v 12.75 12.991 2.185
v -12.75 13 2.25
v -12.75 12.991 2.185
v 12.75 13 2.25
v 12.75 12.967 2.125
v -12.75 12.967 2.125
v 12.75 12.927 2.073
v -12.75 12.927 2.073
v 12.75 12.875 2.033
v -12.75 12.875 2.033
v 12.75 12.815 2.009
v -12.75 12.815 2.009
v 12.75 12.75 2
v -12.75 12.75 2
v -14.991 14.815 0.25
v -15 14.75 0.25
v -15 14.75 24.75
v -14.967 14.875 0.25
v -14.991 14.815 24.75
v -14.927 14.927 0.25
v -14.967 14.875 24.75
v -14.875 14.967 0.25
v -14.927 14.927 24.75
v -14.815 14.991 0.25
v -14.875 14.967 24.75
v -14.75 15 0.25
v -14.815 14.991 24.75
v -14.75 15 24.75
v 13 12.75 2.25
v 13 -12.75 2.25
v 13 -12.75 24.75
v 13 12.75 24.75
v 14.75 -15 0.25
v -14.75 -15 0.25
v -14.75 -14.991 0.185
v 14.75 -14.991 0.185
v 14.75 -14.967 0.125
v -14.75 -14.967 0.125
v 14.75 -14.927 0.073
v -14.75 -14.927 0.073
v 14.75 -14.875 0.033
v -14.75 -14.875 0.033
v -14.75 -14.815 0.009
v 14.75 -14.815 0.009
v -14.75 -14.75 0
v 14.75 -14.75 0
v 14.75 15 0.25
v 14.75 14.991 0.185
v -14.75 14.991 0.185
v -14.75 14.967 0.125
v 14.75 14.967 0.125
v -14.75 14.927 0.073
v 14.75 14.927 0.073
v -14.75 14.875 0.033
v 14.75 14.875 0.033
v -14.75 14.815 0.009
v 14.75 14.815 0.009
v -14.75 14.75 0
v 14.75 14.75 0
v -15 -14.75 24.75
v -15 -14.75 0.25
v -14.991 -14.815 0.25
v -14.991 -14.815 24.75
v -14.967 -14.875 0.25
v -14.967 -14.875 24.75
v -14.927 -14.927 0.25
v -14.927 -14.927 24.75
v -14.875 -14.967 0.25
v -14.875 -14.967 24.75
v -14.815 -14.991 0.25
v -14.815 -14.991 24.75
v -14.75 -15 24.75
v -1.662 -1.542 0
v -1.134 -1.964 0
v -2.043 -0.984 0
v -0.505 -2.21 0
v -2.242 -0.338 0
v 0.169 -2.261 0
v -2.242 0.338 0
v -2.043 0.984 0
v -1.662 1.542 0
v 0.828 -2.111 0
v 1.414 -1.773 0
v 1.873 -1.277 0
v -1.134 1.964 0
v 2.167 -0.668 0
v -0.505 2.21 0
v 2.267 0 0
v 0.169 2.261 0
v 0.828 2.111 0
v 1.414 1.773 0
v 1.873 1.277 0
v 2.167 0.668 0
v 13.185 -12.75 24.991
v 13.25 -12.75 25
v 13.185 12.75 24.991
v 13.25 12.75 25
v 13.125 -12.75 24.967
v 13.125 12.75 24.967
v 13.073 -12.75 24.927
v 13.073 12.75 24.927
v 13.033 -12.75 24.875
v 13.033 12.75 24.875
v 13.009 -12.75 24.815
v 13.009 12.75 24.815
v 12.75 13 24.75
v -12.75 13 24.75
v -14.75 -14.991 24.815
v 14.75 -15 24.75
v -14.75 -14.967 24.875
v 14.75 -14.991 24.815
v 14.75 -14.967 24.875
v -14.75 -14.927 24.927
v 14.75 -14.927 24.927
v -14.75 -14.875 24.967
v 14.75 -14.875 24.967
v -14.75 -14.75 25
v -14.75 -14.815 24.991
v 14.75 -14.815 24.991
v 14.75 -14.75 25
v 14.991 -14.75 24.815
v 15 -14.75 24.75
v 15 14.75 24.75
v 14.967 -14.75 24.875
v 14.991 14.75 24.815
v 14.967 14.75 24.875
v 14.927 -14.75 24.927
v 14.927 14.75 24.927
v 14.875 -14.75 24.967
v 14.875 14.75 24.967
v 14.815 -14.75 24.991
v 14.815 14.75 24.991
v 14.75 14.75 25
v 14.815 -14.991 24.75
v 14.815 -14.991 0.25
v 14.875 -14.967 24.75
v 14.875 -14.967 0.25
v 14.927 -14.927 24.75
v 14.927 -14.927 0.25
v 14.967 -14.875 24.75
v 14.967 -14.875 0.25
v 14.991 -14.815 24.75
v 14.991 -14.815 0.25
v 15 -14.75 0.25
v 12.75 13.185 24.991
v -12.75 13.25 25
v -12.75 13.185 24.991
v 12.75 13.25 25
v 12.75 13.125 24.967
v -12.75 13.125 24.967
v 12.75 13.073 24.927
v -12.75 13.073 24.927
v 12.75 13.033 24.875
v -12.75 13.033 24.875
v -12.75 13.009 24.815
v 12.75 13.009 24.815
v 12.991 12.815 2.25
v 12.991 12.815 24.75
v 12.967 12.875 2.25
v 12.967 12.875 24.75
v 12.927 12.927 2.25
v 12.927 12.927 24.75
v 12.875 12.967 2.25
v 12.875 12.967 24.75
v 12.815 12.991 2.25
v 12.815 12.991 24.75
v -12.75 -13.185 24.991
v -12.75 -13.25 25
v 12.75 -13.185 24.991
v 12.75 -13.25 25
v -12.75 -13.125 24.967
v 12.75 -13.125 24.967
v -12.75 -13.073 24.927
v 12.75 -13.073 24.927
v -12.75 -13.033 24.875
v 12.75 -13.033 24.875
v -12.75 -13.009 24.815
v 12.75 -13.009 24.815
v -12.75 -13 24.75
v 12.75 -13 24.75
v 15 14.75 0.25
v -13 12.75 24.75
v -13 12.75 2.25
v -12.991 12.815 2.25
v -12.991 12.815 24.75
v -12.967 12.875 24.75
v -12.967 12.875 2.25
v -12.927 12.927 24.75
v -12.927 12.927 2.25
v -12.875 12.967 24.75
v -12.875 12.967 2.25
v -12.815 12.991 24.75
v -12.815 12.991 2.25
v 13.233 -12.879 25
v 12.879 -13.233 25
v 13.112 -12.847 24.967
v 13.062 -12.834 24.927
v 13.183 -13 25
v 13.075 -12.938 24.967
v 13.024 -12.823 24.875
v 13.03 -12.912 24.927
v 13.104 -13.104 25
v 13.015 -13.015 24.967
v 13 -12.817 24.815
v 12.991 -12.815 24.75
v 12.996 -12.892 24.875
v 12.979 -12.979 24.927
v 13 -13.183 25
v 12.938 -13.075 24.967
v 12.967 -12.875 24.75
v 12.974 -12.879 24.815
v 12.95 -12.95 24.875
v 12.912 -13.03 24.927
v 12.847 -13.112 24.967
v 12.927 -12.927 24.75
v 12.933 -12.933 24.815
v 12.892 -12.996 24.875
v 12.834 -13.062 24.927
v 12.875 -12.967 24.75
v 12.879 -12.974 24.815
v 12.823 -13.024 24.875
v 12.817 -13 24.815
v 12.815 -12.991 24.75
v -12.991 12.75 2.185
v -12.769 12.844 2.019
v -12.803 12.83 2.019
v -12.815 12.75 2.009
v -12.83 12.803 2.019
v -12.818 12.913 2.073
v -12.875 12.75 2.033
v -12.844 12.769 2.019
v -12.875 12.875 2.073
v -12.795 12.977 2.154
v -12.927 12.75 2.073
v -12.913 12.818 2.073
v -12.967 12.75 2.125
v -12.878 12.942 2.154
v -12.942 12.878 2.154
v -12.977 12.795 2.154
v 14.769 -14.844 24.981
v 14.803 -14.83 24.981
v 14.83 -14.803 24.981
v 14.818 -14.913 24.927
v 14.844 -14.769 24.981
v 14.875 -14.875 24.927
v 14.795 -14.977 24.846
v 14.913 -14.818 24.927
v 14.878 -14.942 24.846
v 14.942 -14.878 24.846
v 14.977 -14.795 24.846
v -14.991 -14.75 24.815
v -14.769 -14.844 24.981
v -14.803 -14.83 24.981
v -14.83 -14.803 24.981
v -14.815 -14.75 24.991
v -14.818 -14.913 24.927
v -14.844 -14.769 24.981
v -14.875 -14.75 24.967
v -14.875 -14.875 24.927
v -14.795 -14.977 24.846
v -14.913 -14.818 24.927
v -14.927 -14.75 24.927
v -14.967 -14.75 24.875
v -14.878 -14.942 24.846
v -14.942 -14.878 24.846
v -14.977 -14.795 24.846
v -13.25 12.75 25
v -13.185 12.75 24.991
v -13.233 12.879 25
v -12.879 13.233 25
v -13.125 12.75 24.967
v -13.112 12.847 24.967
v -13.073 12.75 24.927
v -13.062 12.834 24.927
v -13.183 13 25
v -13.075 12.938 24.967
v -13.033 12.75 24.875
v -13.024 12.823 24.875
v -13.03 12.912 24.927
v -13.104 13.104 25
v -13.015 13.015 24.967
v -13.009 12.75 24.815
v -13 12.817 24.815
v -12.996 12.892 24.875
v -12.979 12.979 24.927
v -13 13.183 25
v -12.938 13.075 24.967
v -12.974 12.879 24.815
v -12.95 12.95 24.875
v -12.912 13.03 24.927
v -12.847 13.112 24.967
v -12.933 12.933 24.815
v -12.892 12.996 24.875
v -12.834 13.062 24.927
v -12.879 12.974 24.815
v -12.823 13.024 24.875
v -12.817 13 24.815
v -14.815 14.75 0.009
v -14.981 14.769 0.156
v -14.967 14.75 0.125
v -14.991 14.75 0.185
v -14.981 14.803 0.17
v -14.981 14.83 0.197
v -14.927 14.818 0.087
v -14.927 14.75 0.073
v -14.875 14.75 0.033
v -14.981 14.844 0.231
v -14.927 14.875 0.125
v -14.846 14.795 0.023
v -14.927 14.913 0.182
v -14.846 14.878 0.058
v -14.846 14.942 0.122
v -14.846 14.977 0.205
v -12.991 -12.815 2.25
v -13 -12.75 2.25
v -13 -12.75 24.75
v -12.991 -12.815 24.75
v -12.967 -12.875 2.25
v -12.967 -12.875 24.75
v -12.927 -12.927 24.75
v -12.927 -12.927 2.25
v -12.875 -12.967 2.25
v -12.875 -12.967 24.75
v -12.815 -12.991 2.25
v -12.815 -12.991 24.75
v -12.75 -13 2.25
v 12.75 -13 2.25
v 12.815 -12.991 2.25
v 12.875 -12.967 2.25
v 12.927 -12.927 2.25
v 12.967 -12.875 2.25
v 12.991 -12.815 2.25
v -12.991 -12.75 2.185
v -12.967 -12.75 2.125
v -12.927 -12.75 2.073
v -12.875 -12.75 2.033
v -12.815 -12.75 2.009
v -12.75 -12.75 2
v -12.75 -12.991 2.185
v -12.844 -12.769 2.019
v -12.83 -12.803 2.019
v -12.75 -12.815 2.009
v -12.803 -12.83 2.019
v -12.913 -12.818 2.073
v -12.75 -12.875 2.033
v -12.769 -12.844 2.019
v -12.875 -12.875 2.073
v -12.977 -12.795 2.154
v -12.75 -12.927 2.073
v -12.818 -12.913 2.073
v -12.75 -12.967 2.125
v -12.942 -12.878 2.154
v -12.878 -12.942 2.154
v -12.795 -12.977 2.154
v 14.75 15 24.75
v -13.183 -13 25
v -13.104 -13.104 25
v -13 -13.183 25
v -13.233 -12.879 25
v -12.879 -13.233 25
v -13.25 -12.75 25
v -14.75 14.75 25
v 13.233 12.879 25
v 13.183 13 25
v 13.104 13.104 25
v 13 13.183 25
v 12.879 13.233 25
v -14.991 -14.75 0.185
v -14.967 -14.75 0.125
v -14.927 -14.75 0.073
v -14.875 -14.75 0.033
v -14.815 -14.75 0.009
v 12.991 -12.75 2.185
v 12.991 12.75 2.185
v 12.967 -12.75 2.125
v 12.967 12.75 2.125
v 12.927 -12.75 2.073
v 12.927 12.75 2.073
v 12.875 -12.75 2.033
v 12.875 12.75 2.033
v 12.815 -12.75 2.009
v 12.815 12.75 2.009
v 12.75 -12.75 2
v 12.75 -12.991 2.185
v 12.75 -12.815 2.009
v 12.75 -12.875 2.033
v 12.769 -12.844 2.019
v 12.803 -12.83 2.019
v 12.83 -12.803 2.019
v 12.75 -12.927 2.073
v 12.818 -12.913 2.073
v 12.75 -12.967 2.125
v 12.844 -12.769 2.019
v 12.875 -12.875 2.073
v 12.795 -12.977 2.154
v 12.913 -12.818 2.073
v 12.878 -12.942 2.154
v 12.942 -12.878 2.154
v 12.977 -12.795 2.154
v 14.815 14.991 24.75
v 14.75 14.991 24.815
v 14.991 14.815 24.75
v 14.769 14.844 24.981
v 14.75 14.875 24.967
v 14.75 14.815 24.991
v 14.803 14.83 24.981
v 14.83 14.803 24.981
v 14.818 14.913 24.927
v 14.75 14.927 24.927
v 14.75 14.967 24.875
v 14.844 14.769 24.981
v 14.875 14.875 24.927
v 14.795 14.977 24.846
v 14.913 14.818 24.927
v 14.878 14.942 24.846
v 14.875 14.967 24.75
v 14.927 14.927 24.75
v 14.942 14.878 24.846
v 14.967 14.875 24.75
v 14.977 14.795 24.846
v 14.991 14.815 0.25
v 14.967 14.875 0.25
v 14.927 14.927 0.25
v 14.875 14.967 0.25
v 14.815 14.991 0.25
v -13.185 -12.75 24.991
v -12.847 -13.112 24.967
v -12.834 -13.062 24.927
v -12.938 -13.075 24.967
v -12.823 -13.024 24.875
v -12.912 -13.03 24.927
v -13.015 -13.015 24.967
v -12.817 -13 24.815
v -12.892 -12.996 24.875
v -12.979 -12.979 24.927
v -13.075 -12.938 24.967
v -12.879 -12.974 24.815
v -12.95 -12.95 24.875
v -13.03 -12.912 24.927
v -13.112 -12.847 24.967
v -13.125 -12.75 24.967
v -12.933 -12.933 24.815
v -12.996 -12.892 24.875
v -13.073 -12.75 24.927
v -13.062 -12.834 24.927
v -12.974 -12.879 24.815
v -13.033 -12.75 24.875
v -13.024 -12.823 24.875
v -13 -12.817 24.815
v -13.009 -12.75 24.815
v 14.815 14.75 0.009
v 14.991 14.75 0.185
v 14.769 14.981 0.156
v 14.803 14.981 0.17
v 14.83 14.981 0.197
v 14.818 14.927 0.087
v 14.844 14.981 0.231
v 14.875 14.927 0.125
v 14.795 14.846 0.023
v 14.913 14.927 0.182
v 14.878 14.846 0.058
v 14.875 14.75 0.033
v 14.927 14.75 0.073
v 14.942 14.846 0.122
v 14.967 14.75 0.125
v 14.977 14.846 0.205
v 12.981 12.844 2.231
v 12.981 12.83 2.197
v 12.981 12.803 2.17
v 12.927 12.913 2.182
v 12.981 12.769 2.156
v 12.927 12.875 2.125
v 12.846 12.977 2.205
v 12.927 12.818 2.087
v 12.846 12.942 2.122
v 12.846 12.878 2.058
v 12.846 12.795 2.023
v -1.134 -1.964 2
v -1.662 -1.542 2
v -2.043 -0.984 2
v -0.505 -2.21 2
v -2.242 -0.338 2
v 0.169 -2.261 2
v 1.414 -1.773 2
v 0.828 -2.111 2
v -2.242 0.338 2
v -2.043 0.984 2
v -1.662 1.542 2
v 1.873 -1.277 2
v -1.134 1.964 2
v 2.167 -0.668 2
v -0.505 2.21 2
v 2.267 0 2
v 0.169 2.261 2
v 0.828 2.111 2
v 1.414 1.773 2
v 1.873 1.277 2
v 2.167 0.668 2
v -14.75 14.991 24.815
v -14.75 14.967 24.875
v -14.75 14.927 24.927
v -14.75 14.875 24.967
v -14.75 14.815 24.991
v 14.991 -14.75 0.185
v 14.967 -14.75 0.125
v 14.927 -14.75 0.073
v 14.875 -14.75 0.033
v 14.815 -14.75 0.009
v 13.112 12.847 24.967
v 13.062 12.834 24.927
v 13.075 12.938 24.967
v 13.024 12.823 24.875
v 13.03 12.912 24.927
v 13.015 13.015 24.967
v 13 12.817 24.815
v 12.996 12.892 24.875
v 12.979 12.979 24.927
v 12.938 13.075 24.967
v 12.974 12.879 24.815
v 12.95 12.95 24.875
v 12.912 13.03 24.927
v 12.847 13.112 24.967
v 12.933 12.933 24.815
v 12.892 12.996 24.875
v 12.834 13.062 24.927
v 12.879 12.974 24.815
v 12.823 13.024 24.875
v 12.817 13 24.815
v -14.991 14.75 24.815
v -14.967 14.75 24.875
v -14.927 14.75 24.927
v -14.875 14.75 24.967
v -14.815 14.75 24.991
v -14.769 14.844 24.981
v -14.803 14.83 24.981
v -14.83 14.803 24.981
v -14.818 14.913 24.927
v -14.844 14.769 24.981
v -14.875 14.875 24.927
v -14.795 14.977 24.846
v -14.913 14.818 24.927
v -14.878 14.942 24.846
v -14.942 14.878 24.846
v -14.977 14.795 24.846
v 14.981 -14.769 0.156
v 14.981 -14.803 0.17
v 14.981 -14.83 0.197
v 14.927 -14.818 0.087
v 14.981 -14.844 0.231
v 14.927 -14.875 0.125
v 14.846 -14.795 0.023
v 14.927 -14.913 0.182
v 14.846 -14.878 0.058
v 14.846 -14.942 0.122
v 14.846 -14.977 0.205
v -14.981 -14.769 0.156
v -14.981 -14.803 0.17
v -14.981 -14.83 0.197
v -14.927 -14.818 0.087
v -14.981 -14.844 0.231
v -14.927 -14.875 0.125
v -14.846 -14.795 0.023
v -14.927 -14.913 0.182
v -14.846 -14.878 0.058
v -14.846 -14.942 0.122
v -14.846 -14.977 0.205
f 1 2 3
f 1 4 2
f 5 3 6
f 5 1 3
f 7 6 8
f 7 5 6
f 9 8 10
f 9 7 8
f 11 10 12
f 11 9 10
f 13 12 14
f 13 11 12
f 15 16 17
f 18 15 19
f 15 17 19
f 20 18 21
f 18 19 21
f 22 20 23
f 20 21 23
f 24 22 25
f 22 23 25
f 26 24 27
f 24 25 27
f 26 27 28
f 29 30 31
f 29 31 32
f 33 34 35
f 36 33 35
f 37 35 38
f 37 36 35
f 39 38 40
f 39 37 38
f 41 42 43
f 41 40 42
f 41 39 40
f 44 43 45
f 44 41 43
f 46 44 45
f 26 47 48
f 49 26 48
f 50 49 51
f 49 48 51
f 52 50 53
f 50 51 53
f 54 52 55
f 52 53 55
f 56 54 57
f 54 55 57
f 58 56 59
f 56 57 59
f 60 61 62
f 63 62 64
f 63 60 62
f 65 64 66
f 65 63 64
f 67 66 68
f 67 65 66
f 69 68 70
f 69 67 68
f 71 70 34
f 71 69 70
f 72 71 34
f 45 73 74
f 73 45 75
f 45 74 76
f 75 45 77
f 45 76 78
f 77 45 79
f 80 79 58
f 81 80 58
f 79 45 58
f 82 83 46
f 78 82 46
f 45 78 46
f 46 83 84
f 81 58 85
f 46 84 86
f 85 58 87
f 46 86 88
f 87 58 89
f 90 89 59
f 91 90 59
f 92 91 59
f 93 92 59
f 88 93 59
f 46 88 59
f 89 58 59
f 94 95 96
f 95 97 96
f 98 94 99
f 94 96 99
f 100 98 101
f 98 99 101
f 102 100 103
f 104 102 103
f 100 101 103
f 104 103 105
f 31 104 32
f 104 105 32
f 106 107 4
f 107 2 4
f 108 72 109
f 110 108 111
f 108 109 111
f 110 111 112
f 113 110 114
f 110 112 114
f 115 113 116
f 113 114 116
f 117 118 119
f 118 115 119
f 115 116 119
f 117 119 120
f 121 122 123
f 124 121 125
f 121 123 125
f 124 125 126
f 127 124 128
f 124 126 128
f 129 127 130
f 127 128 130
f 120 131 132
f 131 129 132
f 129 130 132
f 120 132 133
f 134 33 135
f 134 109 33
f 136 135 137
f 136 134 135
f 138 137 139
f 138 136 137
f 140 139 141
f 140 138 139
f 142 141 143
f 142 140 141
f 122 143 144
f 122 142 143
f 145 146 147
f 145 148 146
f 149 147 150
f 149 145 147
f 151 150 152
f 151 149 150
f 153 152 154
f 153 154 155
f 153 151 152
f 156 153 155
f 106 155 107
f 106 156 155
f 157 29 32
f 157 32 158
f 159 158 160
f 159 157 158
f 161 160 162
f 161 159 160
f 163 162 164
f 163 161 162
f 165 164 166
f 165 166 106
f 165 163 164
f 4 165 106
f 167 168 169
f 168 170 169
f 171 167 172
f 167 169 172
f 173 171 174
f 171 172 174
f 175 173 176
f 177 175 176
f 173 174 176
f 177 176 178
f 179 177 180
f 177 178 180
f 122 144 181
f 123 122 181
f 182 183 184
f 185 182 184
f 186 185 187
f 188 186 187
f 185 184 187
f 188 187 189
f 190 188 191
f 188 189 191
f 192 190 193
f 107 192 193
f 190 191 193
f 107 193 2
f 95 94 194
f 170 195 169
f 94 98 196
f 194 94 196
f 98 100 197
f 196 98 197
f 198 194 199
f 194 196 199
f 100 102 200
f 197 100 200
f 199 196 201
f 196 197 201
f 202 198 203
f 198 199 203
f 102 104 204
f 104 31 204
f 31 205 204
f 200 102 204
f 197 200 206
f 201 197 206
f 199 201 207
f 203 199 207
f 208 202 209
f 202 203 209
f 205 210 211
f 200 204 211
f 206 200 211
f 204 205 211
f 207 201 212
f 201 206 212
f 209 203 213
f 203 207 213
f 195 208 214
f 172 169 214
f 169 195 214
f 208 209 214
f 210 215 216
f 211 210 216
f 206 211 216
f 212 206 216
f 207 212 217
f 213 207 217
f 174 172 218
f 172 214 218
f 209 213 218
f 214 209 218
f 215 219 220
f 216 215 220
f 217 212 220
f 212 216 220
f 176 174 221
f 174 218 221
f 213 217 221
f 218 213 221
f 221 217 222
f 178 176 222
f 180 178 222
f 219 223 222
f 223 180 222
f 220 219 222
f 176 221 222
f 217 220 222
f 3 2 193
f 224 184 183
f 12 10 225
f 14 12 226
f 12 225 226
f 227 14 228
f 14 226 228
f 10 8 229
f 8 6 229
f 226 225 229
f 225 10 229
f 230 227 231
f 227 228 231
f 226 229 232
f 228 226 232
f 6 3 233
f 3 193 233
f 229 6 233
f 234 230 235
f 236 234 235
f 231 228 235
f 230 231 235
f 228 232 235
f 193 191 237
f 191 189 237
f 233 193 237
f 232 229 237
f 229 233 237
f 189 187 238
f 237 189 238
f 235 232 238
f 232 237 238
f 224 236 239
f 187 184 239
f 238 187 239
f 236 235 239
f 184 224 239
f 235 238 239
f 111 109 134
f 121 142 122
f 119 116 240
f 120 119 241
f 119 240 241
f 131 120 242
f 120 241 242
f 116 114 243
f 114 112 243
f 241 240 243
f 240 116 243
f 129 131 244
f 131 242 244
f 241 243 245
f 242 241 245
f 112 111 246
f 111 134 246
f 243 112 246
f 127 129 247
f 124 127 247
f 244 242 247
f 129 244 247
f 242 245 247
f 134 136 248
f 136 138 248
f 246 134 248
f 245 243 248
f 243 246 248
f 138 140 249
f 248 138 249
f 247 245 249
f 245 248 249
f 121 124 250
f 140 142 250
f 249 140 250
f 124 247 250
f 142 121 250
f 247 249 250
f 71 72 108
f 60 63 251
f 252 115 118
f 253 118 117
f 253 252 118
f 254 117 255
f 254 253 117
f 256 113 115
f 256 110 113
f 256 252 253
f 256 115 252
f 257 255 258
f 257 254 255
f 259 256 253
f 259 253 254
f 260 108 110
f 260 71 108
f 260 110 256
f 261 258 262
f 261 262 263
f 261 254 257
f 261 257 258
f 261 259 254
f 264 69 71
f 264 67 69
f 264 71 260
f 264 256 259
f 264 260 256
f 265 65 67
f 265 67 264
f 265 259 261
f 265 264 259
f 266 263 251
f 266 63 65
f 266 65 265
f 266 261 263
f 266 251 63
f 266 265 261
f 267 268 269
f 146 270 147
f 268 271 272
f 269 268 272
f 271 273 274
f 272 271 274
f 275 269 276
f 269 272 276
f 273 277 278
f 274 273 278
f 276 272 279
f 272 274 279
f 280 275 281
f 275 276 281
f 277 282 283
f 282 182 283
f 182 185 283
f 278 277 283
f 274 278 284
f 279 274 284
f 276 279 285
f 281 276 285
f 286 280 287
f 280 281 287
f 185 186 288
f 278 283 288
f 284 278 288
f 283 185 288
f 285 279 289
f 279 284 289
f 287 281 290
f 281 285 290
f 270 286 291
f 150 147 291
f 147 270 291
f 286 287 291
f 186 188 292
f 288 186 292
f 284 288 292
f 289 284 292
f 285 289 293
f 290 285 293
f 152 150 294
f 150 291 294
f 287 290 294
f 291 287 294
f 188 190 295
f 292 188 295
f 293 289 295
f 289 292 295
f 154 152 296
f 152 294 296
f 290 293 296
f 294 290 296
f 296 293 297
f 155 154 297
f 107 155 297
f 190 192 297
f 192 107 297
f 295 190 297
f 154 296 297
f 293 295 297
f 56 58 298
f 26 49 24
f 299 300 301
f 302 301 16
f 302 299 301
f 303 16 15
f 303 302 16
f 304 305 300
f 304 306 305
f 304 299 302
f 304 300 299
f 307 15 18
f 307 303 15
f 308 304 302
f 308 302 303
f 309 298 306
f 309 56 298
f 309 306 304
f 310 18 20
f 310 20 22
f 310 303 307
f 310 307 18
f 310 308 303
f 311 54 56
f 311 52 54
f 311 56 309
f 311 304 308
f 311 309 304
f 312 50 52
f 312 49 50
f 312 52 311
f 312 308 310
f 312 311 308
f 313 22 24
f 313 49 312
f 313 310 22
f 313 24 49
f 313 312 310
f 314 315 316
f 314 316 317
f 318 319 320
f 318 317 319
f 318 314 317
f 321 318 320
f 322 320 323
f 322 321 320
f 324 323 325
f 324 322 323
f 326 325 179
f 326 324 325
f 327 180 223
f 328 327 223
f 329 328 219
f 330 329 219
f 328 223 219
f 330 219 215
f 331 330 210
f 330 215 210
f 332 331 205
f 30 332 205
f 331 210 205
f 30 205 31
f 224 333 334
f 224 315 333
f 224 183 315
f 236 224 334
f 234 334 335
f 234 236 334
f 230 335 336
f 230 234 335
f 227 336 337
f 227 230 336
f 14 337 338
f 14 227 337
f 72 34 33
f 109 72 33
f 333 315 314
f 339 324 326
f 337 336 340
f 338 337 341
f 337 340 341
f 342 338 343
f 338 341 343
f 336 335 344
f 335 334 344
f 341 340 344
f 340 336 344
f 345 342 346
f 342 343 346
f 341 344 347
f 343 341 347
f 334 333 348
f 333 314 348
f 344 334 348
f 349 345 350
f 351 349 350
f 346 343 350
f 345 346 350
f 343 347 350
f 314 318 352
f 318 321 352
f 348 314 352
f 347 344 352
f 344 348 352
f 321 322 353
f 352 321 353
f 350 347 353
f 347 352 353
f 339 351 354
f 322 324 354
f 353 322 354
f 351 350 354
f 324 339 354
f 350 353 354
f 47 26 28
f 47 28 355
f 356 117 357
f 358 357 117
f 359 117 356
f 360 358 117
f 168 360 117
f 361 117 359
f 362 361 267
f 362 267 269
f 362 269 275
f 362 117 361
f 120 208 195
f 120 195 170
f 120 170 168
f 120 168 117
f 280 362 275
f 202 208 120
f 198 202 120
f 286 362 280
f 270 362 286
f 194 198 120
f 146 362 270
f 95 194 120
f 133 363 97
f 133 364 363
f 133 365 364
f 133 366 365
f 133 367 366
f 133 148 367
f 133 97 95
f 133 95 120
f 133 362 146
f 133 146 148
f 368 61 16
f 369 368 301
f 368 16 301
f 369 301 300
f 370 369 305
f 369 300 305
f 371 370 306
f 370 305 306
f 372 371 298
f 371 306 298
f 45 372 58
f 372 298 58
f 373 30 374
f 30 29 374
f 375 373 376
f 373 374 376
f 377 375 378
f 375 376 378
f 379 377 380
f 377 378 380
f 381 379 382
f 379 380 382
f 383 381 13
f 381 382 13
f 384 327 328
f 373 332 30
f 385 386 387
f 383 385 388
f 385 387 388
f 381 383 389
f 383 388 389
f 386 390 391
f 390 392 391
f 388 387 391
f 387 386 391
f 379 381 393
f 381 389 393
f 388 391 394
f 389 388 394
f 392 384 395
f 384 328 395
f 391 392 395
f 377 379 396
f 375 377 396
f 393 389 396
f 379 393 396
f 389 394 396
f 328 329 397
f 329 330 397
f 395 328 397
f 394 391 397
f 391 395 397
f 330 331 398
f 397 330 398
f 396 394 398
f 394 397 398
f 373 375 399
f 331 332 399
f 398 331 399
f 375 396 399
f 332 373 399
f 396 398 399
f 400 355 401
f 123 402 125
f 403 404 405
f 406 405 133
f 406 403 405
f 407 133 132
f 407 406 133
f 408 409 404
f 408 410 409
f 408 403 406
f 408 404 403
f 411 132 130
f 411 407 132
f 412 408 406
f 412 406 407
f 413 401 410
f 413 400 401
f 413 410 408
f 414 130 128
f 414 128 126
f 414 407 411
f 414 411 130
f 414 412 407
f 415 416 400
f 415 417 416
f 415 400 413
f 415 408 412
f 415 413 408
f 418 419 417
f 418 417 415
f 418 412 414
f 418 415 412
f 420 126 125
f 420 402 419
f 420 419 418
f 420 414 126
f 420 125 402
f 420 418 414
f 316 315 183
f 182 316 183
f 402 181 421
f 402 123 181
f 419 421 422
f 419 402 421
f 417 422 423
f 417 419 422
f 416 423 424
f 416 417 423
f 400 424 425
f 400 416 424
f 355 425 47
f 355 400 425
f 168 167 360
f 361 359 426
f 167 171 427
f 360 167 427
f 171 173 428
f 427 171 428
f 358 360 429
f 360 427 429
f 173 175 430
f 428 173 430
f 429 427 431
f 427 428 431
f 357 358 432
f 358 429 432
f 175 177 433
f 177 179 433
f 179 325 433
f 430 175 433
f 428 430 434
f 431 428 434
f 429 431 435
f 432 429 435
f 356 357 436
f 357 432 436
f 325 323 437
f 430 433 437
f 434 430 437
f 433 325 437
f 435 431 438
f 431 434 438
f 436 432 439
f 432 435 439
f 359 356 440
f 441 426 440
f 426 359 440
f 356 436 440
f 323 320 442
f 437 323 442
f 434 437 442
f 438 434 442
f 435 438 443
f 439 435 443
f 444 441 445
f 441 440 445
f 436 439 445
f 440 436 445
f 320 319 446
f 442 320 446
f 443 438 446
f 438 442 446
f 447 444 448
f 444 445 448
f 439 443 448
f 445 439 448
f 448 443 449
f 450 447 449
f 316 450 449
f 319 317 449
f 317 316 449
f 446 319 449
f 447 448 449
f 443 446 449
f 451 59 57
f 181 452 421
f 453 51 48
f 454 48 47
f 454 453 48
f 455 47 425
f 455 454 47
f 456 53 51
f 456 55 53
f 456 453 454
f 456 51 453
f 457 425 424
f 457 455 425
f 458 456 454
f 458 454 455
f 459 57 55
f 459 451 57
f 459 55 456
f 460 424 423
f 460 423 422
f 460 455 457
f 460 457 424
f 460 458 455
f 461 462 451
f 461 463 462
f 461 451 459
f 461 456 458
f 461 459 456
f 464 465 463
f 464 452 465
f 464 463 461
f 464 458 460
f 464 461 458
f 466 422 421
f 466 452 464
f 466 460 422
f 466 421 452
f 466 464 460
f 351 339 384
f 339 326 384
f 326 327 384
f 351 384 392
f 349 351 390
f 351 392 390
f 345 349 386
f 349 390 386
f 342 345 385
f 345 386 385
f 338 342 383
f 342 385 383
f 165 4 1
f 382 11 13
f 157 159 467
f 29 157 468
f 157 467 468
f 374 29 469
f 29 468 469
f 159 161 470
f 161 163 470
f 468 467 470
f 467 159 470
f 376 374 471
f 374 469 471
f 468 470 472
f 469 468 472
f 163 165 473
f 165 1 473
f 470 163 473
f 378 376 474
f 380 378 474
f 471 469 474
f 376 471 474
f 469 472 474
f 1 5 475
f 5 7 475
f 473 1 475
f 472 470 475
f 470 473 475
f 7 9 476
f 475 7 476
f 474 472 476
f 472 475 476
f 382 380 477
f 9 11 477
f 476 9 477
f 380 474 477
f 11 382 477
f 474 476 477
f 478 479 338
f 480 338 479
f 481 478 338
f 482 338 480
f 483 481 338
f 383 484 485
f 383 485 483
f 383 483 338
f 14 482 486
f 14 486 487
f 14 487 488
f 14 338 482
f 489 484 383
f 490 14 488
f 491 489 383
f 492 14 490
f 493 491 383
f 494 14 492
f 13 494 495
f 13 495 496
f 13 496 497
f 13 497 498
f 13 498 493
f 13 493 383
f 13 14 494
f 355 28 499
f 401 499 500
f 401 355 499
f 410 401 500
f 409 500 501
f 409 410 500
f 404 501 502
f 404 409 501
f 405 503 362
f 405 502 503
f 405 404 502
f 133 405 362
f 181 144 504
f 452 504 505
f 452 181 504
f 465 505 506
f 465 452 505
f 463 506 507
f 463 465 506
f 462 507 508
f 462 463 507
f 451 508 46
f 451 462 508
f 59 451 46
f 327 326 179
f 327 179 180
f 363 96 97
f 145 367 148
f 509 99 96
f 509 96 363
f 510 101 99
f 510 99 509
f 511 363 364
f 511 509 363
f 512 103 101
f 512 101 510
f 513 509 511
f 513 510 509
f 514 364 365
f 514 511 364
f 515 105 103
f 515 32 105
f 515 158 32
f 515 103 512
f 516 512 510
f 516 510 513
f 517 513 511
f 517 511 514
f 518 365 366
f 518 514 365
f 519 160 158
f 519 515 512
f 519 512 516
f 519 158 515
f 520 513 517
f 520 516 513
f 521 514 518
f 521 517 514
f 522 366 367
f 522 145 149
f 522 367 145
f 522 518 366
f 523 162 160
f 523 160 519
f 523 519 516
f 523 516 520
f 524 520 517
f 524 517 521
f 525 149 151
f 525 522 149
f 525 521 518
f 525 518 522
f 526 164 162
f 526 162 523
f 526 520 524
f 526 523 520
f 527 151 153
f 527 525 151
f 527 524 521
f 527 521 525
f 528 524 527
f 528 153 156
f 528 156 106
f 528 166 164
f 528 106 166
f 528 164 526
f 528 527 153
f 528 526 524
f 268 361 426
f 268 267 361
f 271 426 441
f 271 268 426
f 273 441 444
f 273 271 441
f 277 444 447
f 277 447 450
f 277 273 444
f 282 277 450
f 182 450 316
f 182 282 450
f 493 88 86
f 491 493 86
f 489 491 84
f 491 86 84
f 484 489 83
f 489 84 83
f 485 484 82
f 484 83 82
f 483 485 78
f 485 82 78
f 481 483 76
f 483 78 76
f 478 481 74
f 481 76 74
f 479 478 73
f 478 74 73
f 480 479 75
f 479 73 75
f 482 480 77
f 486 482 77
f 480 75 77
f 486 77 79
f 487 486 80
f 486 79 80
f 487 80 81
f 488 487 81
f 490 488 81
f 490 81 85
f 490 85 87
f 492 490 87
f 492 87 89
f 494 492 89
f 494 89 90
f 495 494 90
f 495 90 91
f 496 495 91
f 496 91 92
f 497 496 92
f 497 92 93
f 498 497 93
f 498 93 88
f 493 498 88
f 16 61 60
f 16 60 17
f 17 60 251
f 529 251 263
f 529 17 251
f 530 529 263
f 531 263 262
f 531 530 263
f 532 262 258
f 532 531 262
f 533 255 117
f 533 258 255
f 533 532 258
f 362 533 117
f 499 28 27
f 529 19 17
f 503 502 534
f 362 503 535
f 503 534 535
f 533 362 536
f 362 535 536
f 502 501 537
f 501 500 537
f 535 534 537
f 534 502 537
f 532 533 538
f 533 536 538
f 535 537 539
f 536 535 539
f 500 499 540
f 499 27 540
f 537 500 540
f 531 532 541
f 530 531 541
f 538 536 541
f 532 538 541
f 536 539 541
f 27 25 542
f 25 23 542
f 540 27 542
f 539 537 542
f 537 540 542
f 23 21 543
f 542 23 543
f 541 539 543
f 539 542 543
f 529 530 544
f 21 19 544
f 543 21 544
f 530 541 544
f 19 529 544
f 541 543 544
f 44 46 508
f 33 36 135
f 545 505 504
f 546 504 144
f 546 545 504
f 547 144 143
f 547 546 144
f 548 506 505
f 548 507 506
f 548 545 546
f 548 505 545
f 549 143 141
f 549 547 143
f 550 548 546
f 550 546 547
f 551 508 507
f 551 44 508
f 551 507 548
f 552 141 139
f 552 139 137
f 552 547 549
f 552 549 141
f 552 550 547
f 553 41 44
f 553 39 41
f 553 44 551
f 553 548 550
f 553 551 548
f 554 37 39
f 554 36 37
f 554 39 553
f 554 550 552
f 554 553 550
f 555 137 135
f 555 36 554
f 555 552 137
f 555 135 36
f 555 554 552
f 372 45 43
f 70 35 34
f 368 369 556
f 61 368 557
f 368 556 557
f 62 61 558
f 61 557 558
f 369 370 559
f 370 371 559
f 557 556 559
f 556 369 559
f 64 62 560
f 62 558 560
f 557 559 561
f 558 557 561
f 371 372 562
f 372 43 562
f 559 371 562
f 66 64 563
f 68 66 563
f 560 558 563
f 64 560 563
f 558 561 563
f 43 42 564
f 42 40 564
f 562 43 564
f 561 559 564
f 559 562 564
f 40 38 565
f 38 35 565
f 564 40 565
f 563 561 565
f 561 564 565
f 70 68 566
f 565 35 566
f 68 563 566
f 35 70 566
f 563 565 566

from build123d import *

# Parameters (mm, degrees)
F0_W     = 30
F0_H     = 30
F1_DEPTH = 25
F2_T     = -2
F3_R     = 0.25
F4_R     = 2.2673190991
F5_DEPTH = 25.001


with BuildPart() as f1:
    # F0 (on Top) → F1 (new body)
    with BuildSketch(Plane.XY):
        Rectangle(F0_W, F0_H)
    extrude(amount=F1_DEPTH)

    # F2
    f2_openings = [f1.faces().sort_by_distance(p)[0] for p in [
        (0, 0, 25),
    ]]
    offset(amount=F2_T, openings=f2_openings)

    # F3
    f3_edges = [f1.edges().sort_by_distance(p)[0] for p in [
        (0, 13, 25),
        (-13, 13, 13.5),
        (0, 13, 2),
        (13, 13, 13.5),
        (-13, 0, 25),
        (-13, -13, 13.5),
        (-13, 0, 2),
        (0, -13, 25),
        (13, -13, 13.5),
        (0, -13, 2),
        (13, 0, 25),
        (13, 0, 2),
        (0, -15, 0),
        (15, 0, 0),
        (0, 15, 0),
        (-15, 0, 0),
        (-15, -15, 12.5),
        (15, -15, 12.5),
        (0, -15, 25),
        (15, 15, 12.5),
        (-15, 15, 12.5),
        (0, 15, 25),
        (-15, 0, 25),
        (15, 0, 25),
    ]]
    fillet(f3_edges, radius=F3_R)

    # F4 (on face) → F5 (cut, through all)
    with BuildSketch(Plane(origin=(0, 0, 0), x_dir=(1, 0, 0), z_dir=(0, 0, -1))):
        Circle(F4_R)
    extrude(amount=-F5_DEPTH, mode=Mode.SUBTRACT)


solid = f1.part
